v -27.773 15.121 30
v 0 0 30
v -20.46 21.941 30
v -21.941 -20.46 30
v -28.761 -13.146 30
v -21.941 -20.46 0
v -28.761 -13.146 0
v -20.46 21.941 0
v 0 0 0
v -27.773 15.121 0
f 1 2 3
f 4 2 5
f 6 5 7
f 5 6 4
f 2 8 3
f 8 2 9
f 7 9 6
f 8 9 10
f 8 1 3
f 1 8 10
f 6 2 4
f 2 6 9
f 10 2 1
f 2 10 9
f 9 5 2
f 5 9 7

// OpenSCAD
rotate([0,0,88])
rotate([0,-90,0]){
    difference(){
        rotate([-45,0,0]) {
            cube([30, 30, 30]);
        }
        scale([1,2,1]) {
            rotate([-45,0,0]) {
                cube([30, 30, 30]);
            }
        }
    }
}
